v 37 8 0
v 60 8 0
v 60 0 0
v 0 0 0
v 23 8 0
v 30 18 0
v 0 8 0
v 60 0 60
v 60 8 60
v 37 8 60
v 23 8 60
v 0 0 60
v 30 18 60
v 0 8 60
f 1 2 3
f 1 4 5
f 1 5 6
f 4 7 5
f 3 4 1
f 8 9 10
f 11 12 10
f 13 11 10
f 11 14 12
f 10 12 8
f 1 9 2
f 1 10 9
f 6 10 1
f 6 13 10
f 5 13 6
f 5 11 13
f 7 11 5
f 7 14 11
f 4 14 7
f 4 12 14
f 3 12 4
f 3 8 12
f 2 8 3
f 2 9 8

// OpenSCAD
$fn = 32;

// ----------------------------------------------------------------------
// V guide rail: vrib, 60 mm wide
// ----------------------------------------------------------------------

// --- parameters (mm) ---
rail_w = 60;              // rail width, X
base_t = 8;               // base plate thickness
v_depth = 10;             // V feature depth / height
v_half_w = 7;             // half width of the V at the base face
plate_t = 60;             // rail length, Z (the extrusion height)
fit_tol = 0.05;           // declared fit tolerance (prompt contract)
free_tol = 0.2;           // declared free tolerance (prompt contract)

profile = [[0, 0], [60, 0], [60, 8], [37, 8], [30, 18], [23, 8], [0, 8]];  // primary outline, 7 points, counter clockwise

// --- the one profile operation ---
linear_extrude(height = plate_t) polygon(points = profile);
